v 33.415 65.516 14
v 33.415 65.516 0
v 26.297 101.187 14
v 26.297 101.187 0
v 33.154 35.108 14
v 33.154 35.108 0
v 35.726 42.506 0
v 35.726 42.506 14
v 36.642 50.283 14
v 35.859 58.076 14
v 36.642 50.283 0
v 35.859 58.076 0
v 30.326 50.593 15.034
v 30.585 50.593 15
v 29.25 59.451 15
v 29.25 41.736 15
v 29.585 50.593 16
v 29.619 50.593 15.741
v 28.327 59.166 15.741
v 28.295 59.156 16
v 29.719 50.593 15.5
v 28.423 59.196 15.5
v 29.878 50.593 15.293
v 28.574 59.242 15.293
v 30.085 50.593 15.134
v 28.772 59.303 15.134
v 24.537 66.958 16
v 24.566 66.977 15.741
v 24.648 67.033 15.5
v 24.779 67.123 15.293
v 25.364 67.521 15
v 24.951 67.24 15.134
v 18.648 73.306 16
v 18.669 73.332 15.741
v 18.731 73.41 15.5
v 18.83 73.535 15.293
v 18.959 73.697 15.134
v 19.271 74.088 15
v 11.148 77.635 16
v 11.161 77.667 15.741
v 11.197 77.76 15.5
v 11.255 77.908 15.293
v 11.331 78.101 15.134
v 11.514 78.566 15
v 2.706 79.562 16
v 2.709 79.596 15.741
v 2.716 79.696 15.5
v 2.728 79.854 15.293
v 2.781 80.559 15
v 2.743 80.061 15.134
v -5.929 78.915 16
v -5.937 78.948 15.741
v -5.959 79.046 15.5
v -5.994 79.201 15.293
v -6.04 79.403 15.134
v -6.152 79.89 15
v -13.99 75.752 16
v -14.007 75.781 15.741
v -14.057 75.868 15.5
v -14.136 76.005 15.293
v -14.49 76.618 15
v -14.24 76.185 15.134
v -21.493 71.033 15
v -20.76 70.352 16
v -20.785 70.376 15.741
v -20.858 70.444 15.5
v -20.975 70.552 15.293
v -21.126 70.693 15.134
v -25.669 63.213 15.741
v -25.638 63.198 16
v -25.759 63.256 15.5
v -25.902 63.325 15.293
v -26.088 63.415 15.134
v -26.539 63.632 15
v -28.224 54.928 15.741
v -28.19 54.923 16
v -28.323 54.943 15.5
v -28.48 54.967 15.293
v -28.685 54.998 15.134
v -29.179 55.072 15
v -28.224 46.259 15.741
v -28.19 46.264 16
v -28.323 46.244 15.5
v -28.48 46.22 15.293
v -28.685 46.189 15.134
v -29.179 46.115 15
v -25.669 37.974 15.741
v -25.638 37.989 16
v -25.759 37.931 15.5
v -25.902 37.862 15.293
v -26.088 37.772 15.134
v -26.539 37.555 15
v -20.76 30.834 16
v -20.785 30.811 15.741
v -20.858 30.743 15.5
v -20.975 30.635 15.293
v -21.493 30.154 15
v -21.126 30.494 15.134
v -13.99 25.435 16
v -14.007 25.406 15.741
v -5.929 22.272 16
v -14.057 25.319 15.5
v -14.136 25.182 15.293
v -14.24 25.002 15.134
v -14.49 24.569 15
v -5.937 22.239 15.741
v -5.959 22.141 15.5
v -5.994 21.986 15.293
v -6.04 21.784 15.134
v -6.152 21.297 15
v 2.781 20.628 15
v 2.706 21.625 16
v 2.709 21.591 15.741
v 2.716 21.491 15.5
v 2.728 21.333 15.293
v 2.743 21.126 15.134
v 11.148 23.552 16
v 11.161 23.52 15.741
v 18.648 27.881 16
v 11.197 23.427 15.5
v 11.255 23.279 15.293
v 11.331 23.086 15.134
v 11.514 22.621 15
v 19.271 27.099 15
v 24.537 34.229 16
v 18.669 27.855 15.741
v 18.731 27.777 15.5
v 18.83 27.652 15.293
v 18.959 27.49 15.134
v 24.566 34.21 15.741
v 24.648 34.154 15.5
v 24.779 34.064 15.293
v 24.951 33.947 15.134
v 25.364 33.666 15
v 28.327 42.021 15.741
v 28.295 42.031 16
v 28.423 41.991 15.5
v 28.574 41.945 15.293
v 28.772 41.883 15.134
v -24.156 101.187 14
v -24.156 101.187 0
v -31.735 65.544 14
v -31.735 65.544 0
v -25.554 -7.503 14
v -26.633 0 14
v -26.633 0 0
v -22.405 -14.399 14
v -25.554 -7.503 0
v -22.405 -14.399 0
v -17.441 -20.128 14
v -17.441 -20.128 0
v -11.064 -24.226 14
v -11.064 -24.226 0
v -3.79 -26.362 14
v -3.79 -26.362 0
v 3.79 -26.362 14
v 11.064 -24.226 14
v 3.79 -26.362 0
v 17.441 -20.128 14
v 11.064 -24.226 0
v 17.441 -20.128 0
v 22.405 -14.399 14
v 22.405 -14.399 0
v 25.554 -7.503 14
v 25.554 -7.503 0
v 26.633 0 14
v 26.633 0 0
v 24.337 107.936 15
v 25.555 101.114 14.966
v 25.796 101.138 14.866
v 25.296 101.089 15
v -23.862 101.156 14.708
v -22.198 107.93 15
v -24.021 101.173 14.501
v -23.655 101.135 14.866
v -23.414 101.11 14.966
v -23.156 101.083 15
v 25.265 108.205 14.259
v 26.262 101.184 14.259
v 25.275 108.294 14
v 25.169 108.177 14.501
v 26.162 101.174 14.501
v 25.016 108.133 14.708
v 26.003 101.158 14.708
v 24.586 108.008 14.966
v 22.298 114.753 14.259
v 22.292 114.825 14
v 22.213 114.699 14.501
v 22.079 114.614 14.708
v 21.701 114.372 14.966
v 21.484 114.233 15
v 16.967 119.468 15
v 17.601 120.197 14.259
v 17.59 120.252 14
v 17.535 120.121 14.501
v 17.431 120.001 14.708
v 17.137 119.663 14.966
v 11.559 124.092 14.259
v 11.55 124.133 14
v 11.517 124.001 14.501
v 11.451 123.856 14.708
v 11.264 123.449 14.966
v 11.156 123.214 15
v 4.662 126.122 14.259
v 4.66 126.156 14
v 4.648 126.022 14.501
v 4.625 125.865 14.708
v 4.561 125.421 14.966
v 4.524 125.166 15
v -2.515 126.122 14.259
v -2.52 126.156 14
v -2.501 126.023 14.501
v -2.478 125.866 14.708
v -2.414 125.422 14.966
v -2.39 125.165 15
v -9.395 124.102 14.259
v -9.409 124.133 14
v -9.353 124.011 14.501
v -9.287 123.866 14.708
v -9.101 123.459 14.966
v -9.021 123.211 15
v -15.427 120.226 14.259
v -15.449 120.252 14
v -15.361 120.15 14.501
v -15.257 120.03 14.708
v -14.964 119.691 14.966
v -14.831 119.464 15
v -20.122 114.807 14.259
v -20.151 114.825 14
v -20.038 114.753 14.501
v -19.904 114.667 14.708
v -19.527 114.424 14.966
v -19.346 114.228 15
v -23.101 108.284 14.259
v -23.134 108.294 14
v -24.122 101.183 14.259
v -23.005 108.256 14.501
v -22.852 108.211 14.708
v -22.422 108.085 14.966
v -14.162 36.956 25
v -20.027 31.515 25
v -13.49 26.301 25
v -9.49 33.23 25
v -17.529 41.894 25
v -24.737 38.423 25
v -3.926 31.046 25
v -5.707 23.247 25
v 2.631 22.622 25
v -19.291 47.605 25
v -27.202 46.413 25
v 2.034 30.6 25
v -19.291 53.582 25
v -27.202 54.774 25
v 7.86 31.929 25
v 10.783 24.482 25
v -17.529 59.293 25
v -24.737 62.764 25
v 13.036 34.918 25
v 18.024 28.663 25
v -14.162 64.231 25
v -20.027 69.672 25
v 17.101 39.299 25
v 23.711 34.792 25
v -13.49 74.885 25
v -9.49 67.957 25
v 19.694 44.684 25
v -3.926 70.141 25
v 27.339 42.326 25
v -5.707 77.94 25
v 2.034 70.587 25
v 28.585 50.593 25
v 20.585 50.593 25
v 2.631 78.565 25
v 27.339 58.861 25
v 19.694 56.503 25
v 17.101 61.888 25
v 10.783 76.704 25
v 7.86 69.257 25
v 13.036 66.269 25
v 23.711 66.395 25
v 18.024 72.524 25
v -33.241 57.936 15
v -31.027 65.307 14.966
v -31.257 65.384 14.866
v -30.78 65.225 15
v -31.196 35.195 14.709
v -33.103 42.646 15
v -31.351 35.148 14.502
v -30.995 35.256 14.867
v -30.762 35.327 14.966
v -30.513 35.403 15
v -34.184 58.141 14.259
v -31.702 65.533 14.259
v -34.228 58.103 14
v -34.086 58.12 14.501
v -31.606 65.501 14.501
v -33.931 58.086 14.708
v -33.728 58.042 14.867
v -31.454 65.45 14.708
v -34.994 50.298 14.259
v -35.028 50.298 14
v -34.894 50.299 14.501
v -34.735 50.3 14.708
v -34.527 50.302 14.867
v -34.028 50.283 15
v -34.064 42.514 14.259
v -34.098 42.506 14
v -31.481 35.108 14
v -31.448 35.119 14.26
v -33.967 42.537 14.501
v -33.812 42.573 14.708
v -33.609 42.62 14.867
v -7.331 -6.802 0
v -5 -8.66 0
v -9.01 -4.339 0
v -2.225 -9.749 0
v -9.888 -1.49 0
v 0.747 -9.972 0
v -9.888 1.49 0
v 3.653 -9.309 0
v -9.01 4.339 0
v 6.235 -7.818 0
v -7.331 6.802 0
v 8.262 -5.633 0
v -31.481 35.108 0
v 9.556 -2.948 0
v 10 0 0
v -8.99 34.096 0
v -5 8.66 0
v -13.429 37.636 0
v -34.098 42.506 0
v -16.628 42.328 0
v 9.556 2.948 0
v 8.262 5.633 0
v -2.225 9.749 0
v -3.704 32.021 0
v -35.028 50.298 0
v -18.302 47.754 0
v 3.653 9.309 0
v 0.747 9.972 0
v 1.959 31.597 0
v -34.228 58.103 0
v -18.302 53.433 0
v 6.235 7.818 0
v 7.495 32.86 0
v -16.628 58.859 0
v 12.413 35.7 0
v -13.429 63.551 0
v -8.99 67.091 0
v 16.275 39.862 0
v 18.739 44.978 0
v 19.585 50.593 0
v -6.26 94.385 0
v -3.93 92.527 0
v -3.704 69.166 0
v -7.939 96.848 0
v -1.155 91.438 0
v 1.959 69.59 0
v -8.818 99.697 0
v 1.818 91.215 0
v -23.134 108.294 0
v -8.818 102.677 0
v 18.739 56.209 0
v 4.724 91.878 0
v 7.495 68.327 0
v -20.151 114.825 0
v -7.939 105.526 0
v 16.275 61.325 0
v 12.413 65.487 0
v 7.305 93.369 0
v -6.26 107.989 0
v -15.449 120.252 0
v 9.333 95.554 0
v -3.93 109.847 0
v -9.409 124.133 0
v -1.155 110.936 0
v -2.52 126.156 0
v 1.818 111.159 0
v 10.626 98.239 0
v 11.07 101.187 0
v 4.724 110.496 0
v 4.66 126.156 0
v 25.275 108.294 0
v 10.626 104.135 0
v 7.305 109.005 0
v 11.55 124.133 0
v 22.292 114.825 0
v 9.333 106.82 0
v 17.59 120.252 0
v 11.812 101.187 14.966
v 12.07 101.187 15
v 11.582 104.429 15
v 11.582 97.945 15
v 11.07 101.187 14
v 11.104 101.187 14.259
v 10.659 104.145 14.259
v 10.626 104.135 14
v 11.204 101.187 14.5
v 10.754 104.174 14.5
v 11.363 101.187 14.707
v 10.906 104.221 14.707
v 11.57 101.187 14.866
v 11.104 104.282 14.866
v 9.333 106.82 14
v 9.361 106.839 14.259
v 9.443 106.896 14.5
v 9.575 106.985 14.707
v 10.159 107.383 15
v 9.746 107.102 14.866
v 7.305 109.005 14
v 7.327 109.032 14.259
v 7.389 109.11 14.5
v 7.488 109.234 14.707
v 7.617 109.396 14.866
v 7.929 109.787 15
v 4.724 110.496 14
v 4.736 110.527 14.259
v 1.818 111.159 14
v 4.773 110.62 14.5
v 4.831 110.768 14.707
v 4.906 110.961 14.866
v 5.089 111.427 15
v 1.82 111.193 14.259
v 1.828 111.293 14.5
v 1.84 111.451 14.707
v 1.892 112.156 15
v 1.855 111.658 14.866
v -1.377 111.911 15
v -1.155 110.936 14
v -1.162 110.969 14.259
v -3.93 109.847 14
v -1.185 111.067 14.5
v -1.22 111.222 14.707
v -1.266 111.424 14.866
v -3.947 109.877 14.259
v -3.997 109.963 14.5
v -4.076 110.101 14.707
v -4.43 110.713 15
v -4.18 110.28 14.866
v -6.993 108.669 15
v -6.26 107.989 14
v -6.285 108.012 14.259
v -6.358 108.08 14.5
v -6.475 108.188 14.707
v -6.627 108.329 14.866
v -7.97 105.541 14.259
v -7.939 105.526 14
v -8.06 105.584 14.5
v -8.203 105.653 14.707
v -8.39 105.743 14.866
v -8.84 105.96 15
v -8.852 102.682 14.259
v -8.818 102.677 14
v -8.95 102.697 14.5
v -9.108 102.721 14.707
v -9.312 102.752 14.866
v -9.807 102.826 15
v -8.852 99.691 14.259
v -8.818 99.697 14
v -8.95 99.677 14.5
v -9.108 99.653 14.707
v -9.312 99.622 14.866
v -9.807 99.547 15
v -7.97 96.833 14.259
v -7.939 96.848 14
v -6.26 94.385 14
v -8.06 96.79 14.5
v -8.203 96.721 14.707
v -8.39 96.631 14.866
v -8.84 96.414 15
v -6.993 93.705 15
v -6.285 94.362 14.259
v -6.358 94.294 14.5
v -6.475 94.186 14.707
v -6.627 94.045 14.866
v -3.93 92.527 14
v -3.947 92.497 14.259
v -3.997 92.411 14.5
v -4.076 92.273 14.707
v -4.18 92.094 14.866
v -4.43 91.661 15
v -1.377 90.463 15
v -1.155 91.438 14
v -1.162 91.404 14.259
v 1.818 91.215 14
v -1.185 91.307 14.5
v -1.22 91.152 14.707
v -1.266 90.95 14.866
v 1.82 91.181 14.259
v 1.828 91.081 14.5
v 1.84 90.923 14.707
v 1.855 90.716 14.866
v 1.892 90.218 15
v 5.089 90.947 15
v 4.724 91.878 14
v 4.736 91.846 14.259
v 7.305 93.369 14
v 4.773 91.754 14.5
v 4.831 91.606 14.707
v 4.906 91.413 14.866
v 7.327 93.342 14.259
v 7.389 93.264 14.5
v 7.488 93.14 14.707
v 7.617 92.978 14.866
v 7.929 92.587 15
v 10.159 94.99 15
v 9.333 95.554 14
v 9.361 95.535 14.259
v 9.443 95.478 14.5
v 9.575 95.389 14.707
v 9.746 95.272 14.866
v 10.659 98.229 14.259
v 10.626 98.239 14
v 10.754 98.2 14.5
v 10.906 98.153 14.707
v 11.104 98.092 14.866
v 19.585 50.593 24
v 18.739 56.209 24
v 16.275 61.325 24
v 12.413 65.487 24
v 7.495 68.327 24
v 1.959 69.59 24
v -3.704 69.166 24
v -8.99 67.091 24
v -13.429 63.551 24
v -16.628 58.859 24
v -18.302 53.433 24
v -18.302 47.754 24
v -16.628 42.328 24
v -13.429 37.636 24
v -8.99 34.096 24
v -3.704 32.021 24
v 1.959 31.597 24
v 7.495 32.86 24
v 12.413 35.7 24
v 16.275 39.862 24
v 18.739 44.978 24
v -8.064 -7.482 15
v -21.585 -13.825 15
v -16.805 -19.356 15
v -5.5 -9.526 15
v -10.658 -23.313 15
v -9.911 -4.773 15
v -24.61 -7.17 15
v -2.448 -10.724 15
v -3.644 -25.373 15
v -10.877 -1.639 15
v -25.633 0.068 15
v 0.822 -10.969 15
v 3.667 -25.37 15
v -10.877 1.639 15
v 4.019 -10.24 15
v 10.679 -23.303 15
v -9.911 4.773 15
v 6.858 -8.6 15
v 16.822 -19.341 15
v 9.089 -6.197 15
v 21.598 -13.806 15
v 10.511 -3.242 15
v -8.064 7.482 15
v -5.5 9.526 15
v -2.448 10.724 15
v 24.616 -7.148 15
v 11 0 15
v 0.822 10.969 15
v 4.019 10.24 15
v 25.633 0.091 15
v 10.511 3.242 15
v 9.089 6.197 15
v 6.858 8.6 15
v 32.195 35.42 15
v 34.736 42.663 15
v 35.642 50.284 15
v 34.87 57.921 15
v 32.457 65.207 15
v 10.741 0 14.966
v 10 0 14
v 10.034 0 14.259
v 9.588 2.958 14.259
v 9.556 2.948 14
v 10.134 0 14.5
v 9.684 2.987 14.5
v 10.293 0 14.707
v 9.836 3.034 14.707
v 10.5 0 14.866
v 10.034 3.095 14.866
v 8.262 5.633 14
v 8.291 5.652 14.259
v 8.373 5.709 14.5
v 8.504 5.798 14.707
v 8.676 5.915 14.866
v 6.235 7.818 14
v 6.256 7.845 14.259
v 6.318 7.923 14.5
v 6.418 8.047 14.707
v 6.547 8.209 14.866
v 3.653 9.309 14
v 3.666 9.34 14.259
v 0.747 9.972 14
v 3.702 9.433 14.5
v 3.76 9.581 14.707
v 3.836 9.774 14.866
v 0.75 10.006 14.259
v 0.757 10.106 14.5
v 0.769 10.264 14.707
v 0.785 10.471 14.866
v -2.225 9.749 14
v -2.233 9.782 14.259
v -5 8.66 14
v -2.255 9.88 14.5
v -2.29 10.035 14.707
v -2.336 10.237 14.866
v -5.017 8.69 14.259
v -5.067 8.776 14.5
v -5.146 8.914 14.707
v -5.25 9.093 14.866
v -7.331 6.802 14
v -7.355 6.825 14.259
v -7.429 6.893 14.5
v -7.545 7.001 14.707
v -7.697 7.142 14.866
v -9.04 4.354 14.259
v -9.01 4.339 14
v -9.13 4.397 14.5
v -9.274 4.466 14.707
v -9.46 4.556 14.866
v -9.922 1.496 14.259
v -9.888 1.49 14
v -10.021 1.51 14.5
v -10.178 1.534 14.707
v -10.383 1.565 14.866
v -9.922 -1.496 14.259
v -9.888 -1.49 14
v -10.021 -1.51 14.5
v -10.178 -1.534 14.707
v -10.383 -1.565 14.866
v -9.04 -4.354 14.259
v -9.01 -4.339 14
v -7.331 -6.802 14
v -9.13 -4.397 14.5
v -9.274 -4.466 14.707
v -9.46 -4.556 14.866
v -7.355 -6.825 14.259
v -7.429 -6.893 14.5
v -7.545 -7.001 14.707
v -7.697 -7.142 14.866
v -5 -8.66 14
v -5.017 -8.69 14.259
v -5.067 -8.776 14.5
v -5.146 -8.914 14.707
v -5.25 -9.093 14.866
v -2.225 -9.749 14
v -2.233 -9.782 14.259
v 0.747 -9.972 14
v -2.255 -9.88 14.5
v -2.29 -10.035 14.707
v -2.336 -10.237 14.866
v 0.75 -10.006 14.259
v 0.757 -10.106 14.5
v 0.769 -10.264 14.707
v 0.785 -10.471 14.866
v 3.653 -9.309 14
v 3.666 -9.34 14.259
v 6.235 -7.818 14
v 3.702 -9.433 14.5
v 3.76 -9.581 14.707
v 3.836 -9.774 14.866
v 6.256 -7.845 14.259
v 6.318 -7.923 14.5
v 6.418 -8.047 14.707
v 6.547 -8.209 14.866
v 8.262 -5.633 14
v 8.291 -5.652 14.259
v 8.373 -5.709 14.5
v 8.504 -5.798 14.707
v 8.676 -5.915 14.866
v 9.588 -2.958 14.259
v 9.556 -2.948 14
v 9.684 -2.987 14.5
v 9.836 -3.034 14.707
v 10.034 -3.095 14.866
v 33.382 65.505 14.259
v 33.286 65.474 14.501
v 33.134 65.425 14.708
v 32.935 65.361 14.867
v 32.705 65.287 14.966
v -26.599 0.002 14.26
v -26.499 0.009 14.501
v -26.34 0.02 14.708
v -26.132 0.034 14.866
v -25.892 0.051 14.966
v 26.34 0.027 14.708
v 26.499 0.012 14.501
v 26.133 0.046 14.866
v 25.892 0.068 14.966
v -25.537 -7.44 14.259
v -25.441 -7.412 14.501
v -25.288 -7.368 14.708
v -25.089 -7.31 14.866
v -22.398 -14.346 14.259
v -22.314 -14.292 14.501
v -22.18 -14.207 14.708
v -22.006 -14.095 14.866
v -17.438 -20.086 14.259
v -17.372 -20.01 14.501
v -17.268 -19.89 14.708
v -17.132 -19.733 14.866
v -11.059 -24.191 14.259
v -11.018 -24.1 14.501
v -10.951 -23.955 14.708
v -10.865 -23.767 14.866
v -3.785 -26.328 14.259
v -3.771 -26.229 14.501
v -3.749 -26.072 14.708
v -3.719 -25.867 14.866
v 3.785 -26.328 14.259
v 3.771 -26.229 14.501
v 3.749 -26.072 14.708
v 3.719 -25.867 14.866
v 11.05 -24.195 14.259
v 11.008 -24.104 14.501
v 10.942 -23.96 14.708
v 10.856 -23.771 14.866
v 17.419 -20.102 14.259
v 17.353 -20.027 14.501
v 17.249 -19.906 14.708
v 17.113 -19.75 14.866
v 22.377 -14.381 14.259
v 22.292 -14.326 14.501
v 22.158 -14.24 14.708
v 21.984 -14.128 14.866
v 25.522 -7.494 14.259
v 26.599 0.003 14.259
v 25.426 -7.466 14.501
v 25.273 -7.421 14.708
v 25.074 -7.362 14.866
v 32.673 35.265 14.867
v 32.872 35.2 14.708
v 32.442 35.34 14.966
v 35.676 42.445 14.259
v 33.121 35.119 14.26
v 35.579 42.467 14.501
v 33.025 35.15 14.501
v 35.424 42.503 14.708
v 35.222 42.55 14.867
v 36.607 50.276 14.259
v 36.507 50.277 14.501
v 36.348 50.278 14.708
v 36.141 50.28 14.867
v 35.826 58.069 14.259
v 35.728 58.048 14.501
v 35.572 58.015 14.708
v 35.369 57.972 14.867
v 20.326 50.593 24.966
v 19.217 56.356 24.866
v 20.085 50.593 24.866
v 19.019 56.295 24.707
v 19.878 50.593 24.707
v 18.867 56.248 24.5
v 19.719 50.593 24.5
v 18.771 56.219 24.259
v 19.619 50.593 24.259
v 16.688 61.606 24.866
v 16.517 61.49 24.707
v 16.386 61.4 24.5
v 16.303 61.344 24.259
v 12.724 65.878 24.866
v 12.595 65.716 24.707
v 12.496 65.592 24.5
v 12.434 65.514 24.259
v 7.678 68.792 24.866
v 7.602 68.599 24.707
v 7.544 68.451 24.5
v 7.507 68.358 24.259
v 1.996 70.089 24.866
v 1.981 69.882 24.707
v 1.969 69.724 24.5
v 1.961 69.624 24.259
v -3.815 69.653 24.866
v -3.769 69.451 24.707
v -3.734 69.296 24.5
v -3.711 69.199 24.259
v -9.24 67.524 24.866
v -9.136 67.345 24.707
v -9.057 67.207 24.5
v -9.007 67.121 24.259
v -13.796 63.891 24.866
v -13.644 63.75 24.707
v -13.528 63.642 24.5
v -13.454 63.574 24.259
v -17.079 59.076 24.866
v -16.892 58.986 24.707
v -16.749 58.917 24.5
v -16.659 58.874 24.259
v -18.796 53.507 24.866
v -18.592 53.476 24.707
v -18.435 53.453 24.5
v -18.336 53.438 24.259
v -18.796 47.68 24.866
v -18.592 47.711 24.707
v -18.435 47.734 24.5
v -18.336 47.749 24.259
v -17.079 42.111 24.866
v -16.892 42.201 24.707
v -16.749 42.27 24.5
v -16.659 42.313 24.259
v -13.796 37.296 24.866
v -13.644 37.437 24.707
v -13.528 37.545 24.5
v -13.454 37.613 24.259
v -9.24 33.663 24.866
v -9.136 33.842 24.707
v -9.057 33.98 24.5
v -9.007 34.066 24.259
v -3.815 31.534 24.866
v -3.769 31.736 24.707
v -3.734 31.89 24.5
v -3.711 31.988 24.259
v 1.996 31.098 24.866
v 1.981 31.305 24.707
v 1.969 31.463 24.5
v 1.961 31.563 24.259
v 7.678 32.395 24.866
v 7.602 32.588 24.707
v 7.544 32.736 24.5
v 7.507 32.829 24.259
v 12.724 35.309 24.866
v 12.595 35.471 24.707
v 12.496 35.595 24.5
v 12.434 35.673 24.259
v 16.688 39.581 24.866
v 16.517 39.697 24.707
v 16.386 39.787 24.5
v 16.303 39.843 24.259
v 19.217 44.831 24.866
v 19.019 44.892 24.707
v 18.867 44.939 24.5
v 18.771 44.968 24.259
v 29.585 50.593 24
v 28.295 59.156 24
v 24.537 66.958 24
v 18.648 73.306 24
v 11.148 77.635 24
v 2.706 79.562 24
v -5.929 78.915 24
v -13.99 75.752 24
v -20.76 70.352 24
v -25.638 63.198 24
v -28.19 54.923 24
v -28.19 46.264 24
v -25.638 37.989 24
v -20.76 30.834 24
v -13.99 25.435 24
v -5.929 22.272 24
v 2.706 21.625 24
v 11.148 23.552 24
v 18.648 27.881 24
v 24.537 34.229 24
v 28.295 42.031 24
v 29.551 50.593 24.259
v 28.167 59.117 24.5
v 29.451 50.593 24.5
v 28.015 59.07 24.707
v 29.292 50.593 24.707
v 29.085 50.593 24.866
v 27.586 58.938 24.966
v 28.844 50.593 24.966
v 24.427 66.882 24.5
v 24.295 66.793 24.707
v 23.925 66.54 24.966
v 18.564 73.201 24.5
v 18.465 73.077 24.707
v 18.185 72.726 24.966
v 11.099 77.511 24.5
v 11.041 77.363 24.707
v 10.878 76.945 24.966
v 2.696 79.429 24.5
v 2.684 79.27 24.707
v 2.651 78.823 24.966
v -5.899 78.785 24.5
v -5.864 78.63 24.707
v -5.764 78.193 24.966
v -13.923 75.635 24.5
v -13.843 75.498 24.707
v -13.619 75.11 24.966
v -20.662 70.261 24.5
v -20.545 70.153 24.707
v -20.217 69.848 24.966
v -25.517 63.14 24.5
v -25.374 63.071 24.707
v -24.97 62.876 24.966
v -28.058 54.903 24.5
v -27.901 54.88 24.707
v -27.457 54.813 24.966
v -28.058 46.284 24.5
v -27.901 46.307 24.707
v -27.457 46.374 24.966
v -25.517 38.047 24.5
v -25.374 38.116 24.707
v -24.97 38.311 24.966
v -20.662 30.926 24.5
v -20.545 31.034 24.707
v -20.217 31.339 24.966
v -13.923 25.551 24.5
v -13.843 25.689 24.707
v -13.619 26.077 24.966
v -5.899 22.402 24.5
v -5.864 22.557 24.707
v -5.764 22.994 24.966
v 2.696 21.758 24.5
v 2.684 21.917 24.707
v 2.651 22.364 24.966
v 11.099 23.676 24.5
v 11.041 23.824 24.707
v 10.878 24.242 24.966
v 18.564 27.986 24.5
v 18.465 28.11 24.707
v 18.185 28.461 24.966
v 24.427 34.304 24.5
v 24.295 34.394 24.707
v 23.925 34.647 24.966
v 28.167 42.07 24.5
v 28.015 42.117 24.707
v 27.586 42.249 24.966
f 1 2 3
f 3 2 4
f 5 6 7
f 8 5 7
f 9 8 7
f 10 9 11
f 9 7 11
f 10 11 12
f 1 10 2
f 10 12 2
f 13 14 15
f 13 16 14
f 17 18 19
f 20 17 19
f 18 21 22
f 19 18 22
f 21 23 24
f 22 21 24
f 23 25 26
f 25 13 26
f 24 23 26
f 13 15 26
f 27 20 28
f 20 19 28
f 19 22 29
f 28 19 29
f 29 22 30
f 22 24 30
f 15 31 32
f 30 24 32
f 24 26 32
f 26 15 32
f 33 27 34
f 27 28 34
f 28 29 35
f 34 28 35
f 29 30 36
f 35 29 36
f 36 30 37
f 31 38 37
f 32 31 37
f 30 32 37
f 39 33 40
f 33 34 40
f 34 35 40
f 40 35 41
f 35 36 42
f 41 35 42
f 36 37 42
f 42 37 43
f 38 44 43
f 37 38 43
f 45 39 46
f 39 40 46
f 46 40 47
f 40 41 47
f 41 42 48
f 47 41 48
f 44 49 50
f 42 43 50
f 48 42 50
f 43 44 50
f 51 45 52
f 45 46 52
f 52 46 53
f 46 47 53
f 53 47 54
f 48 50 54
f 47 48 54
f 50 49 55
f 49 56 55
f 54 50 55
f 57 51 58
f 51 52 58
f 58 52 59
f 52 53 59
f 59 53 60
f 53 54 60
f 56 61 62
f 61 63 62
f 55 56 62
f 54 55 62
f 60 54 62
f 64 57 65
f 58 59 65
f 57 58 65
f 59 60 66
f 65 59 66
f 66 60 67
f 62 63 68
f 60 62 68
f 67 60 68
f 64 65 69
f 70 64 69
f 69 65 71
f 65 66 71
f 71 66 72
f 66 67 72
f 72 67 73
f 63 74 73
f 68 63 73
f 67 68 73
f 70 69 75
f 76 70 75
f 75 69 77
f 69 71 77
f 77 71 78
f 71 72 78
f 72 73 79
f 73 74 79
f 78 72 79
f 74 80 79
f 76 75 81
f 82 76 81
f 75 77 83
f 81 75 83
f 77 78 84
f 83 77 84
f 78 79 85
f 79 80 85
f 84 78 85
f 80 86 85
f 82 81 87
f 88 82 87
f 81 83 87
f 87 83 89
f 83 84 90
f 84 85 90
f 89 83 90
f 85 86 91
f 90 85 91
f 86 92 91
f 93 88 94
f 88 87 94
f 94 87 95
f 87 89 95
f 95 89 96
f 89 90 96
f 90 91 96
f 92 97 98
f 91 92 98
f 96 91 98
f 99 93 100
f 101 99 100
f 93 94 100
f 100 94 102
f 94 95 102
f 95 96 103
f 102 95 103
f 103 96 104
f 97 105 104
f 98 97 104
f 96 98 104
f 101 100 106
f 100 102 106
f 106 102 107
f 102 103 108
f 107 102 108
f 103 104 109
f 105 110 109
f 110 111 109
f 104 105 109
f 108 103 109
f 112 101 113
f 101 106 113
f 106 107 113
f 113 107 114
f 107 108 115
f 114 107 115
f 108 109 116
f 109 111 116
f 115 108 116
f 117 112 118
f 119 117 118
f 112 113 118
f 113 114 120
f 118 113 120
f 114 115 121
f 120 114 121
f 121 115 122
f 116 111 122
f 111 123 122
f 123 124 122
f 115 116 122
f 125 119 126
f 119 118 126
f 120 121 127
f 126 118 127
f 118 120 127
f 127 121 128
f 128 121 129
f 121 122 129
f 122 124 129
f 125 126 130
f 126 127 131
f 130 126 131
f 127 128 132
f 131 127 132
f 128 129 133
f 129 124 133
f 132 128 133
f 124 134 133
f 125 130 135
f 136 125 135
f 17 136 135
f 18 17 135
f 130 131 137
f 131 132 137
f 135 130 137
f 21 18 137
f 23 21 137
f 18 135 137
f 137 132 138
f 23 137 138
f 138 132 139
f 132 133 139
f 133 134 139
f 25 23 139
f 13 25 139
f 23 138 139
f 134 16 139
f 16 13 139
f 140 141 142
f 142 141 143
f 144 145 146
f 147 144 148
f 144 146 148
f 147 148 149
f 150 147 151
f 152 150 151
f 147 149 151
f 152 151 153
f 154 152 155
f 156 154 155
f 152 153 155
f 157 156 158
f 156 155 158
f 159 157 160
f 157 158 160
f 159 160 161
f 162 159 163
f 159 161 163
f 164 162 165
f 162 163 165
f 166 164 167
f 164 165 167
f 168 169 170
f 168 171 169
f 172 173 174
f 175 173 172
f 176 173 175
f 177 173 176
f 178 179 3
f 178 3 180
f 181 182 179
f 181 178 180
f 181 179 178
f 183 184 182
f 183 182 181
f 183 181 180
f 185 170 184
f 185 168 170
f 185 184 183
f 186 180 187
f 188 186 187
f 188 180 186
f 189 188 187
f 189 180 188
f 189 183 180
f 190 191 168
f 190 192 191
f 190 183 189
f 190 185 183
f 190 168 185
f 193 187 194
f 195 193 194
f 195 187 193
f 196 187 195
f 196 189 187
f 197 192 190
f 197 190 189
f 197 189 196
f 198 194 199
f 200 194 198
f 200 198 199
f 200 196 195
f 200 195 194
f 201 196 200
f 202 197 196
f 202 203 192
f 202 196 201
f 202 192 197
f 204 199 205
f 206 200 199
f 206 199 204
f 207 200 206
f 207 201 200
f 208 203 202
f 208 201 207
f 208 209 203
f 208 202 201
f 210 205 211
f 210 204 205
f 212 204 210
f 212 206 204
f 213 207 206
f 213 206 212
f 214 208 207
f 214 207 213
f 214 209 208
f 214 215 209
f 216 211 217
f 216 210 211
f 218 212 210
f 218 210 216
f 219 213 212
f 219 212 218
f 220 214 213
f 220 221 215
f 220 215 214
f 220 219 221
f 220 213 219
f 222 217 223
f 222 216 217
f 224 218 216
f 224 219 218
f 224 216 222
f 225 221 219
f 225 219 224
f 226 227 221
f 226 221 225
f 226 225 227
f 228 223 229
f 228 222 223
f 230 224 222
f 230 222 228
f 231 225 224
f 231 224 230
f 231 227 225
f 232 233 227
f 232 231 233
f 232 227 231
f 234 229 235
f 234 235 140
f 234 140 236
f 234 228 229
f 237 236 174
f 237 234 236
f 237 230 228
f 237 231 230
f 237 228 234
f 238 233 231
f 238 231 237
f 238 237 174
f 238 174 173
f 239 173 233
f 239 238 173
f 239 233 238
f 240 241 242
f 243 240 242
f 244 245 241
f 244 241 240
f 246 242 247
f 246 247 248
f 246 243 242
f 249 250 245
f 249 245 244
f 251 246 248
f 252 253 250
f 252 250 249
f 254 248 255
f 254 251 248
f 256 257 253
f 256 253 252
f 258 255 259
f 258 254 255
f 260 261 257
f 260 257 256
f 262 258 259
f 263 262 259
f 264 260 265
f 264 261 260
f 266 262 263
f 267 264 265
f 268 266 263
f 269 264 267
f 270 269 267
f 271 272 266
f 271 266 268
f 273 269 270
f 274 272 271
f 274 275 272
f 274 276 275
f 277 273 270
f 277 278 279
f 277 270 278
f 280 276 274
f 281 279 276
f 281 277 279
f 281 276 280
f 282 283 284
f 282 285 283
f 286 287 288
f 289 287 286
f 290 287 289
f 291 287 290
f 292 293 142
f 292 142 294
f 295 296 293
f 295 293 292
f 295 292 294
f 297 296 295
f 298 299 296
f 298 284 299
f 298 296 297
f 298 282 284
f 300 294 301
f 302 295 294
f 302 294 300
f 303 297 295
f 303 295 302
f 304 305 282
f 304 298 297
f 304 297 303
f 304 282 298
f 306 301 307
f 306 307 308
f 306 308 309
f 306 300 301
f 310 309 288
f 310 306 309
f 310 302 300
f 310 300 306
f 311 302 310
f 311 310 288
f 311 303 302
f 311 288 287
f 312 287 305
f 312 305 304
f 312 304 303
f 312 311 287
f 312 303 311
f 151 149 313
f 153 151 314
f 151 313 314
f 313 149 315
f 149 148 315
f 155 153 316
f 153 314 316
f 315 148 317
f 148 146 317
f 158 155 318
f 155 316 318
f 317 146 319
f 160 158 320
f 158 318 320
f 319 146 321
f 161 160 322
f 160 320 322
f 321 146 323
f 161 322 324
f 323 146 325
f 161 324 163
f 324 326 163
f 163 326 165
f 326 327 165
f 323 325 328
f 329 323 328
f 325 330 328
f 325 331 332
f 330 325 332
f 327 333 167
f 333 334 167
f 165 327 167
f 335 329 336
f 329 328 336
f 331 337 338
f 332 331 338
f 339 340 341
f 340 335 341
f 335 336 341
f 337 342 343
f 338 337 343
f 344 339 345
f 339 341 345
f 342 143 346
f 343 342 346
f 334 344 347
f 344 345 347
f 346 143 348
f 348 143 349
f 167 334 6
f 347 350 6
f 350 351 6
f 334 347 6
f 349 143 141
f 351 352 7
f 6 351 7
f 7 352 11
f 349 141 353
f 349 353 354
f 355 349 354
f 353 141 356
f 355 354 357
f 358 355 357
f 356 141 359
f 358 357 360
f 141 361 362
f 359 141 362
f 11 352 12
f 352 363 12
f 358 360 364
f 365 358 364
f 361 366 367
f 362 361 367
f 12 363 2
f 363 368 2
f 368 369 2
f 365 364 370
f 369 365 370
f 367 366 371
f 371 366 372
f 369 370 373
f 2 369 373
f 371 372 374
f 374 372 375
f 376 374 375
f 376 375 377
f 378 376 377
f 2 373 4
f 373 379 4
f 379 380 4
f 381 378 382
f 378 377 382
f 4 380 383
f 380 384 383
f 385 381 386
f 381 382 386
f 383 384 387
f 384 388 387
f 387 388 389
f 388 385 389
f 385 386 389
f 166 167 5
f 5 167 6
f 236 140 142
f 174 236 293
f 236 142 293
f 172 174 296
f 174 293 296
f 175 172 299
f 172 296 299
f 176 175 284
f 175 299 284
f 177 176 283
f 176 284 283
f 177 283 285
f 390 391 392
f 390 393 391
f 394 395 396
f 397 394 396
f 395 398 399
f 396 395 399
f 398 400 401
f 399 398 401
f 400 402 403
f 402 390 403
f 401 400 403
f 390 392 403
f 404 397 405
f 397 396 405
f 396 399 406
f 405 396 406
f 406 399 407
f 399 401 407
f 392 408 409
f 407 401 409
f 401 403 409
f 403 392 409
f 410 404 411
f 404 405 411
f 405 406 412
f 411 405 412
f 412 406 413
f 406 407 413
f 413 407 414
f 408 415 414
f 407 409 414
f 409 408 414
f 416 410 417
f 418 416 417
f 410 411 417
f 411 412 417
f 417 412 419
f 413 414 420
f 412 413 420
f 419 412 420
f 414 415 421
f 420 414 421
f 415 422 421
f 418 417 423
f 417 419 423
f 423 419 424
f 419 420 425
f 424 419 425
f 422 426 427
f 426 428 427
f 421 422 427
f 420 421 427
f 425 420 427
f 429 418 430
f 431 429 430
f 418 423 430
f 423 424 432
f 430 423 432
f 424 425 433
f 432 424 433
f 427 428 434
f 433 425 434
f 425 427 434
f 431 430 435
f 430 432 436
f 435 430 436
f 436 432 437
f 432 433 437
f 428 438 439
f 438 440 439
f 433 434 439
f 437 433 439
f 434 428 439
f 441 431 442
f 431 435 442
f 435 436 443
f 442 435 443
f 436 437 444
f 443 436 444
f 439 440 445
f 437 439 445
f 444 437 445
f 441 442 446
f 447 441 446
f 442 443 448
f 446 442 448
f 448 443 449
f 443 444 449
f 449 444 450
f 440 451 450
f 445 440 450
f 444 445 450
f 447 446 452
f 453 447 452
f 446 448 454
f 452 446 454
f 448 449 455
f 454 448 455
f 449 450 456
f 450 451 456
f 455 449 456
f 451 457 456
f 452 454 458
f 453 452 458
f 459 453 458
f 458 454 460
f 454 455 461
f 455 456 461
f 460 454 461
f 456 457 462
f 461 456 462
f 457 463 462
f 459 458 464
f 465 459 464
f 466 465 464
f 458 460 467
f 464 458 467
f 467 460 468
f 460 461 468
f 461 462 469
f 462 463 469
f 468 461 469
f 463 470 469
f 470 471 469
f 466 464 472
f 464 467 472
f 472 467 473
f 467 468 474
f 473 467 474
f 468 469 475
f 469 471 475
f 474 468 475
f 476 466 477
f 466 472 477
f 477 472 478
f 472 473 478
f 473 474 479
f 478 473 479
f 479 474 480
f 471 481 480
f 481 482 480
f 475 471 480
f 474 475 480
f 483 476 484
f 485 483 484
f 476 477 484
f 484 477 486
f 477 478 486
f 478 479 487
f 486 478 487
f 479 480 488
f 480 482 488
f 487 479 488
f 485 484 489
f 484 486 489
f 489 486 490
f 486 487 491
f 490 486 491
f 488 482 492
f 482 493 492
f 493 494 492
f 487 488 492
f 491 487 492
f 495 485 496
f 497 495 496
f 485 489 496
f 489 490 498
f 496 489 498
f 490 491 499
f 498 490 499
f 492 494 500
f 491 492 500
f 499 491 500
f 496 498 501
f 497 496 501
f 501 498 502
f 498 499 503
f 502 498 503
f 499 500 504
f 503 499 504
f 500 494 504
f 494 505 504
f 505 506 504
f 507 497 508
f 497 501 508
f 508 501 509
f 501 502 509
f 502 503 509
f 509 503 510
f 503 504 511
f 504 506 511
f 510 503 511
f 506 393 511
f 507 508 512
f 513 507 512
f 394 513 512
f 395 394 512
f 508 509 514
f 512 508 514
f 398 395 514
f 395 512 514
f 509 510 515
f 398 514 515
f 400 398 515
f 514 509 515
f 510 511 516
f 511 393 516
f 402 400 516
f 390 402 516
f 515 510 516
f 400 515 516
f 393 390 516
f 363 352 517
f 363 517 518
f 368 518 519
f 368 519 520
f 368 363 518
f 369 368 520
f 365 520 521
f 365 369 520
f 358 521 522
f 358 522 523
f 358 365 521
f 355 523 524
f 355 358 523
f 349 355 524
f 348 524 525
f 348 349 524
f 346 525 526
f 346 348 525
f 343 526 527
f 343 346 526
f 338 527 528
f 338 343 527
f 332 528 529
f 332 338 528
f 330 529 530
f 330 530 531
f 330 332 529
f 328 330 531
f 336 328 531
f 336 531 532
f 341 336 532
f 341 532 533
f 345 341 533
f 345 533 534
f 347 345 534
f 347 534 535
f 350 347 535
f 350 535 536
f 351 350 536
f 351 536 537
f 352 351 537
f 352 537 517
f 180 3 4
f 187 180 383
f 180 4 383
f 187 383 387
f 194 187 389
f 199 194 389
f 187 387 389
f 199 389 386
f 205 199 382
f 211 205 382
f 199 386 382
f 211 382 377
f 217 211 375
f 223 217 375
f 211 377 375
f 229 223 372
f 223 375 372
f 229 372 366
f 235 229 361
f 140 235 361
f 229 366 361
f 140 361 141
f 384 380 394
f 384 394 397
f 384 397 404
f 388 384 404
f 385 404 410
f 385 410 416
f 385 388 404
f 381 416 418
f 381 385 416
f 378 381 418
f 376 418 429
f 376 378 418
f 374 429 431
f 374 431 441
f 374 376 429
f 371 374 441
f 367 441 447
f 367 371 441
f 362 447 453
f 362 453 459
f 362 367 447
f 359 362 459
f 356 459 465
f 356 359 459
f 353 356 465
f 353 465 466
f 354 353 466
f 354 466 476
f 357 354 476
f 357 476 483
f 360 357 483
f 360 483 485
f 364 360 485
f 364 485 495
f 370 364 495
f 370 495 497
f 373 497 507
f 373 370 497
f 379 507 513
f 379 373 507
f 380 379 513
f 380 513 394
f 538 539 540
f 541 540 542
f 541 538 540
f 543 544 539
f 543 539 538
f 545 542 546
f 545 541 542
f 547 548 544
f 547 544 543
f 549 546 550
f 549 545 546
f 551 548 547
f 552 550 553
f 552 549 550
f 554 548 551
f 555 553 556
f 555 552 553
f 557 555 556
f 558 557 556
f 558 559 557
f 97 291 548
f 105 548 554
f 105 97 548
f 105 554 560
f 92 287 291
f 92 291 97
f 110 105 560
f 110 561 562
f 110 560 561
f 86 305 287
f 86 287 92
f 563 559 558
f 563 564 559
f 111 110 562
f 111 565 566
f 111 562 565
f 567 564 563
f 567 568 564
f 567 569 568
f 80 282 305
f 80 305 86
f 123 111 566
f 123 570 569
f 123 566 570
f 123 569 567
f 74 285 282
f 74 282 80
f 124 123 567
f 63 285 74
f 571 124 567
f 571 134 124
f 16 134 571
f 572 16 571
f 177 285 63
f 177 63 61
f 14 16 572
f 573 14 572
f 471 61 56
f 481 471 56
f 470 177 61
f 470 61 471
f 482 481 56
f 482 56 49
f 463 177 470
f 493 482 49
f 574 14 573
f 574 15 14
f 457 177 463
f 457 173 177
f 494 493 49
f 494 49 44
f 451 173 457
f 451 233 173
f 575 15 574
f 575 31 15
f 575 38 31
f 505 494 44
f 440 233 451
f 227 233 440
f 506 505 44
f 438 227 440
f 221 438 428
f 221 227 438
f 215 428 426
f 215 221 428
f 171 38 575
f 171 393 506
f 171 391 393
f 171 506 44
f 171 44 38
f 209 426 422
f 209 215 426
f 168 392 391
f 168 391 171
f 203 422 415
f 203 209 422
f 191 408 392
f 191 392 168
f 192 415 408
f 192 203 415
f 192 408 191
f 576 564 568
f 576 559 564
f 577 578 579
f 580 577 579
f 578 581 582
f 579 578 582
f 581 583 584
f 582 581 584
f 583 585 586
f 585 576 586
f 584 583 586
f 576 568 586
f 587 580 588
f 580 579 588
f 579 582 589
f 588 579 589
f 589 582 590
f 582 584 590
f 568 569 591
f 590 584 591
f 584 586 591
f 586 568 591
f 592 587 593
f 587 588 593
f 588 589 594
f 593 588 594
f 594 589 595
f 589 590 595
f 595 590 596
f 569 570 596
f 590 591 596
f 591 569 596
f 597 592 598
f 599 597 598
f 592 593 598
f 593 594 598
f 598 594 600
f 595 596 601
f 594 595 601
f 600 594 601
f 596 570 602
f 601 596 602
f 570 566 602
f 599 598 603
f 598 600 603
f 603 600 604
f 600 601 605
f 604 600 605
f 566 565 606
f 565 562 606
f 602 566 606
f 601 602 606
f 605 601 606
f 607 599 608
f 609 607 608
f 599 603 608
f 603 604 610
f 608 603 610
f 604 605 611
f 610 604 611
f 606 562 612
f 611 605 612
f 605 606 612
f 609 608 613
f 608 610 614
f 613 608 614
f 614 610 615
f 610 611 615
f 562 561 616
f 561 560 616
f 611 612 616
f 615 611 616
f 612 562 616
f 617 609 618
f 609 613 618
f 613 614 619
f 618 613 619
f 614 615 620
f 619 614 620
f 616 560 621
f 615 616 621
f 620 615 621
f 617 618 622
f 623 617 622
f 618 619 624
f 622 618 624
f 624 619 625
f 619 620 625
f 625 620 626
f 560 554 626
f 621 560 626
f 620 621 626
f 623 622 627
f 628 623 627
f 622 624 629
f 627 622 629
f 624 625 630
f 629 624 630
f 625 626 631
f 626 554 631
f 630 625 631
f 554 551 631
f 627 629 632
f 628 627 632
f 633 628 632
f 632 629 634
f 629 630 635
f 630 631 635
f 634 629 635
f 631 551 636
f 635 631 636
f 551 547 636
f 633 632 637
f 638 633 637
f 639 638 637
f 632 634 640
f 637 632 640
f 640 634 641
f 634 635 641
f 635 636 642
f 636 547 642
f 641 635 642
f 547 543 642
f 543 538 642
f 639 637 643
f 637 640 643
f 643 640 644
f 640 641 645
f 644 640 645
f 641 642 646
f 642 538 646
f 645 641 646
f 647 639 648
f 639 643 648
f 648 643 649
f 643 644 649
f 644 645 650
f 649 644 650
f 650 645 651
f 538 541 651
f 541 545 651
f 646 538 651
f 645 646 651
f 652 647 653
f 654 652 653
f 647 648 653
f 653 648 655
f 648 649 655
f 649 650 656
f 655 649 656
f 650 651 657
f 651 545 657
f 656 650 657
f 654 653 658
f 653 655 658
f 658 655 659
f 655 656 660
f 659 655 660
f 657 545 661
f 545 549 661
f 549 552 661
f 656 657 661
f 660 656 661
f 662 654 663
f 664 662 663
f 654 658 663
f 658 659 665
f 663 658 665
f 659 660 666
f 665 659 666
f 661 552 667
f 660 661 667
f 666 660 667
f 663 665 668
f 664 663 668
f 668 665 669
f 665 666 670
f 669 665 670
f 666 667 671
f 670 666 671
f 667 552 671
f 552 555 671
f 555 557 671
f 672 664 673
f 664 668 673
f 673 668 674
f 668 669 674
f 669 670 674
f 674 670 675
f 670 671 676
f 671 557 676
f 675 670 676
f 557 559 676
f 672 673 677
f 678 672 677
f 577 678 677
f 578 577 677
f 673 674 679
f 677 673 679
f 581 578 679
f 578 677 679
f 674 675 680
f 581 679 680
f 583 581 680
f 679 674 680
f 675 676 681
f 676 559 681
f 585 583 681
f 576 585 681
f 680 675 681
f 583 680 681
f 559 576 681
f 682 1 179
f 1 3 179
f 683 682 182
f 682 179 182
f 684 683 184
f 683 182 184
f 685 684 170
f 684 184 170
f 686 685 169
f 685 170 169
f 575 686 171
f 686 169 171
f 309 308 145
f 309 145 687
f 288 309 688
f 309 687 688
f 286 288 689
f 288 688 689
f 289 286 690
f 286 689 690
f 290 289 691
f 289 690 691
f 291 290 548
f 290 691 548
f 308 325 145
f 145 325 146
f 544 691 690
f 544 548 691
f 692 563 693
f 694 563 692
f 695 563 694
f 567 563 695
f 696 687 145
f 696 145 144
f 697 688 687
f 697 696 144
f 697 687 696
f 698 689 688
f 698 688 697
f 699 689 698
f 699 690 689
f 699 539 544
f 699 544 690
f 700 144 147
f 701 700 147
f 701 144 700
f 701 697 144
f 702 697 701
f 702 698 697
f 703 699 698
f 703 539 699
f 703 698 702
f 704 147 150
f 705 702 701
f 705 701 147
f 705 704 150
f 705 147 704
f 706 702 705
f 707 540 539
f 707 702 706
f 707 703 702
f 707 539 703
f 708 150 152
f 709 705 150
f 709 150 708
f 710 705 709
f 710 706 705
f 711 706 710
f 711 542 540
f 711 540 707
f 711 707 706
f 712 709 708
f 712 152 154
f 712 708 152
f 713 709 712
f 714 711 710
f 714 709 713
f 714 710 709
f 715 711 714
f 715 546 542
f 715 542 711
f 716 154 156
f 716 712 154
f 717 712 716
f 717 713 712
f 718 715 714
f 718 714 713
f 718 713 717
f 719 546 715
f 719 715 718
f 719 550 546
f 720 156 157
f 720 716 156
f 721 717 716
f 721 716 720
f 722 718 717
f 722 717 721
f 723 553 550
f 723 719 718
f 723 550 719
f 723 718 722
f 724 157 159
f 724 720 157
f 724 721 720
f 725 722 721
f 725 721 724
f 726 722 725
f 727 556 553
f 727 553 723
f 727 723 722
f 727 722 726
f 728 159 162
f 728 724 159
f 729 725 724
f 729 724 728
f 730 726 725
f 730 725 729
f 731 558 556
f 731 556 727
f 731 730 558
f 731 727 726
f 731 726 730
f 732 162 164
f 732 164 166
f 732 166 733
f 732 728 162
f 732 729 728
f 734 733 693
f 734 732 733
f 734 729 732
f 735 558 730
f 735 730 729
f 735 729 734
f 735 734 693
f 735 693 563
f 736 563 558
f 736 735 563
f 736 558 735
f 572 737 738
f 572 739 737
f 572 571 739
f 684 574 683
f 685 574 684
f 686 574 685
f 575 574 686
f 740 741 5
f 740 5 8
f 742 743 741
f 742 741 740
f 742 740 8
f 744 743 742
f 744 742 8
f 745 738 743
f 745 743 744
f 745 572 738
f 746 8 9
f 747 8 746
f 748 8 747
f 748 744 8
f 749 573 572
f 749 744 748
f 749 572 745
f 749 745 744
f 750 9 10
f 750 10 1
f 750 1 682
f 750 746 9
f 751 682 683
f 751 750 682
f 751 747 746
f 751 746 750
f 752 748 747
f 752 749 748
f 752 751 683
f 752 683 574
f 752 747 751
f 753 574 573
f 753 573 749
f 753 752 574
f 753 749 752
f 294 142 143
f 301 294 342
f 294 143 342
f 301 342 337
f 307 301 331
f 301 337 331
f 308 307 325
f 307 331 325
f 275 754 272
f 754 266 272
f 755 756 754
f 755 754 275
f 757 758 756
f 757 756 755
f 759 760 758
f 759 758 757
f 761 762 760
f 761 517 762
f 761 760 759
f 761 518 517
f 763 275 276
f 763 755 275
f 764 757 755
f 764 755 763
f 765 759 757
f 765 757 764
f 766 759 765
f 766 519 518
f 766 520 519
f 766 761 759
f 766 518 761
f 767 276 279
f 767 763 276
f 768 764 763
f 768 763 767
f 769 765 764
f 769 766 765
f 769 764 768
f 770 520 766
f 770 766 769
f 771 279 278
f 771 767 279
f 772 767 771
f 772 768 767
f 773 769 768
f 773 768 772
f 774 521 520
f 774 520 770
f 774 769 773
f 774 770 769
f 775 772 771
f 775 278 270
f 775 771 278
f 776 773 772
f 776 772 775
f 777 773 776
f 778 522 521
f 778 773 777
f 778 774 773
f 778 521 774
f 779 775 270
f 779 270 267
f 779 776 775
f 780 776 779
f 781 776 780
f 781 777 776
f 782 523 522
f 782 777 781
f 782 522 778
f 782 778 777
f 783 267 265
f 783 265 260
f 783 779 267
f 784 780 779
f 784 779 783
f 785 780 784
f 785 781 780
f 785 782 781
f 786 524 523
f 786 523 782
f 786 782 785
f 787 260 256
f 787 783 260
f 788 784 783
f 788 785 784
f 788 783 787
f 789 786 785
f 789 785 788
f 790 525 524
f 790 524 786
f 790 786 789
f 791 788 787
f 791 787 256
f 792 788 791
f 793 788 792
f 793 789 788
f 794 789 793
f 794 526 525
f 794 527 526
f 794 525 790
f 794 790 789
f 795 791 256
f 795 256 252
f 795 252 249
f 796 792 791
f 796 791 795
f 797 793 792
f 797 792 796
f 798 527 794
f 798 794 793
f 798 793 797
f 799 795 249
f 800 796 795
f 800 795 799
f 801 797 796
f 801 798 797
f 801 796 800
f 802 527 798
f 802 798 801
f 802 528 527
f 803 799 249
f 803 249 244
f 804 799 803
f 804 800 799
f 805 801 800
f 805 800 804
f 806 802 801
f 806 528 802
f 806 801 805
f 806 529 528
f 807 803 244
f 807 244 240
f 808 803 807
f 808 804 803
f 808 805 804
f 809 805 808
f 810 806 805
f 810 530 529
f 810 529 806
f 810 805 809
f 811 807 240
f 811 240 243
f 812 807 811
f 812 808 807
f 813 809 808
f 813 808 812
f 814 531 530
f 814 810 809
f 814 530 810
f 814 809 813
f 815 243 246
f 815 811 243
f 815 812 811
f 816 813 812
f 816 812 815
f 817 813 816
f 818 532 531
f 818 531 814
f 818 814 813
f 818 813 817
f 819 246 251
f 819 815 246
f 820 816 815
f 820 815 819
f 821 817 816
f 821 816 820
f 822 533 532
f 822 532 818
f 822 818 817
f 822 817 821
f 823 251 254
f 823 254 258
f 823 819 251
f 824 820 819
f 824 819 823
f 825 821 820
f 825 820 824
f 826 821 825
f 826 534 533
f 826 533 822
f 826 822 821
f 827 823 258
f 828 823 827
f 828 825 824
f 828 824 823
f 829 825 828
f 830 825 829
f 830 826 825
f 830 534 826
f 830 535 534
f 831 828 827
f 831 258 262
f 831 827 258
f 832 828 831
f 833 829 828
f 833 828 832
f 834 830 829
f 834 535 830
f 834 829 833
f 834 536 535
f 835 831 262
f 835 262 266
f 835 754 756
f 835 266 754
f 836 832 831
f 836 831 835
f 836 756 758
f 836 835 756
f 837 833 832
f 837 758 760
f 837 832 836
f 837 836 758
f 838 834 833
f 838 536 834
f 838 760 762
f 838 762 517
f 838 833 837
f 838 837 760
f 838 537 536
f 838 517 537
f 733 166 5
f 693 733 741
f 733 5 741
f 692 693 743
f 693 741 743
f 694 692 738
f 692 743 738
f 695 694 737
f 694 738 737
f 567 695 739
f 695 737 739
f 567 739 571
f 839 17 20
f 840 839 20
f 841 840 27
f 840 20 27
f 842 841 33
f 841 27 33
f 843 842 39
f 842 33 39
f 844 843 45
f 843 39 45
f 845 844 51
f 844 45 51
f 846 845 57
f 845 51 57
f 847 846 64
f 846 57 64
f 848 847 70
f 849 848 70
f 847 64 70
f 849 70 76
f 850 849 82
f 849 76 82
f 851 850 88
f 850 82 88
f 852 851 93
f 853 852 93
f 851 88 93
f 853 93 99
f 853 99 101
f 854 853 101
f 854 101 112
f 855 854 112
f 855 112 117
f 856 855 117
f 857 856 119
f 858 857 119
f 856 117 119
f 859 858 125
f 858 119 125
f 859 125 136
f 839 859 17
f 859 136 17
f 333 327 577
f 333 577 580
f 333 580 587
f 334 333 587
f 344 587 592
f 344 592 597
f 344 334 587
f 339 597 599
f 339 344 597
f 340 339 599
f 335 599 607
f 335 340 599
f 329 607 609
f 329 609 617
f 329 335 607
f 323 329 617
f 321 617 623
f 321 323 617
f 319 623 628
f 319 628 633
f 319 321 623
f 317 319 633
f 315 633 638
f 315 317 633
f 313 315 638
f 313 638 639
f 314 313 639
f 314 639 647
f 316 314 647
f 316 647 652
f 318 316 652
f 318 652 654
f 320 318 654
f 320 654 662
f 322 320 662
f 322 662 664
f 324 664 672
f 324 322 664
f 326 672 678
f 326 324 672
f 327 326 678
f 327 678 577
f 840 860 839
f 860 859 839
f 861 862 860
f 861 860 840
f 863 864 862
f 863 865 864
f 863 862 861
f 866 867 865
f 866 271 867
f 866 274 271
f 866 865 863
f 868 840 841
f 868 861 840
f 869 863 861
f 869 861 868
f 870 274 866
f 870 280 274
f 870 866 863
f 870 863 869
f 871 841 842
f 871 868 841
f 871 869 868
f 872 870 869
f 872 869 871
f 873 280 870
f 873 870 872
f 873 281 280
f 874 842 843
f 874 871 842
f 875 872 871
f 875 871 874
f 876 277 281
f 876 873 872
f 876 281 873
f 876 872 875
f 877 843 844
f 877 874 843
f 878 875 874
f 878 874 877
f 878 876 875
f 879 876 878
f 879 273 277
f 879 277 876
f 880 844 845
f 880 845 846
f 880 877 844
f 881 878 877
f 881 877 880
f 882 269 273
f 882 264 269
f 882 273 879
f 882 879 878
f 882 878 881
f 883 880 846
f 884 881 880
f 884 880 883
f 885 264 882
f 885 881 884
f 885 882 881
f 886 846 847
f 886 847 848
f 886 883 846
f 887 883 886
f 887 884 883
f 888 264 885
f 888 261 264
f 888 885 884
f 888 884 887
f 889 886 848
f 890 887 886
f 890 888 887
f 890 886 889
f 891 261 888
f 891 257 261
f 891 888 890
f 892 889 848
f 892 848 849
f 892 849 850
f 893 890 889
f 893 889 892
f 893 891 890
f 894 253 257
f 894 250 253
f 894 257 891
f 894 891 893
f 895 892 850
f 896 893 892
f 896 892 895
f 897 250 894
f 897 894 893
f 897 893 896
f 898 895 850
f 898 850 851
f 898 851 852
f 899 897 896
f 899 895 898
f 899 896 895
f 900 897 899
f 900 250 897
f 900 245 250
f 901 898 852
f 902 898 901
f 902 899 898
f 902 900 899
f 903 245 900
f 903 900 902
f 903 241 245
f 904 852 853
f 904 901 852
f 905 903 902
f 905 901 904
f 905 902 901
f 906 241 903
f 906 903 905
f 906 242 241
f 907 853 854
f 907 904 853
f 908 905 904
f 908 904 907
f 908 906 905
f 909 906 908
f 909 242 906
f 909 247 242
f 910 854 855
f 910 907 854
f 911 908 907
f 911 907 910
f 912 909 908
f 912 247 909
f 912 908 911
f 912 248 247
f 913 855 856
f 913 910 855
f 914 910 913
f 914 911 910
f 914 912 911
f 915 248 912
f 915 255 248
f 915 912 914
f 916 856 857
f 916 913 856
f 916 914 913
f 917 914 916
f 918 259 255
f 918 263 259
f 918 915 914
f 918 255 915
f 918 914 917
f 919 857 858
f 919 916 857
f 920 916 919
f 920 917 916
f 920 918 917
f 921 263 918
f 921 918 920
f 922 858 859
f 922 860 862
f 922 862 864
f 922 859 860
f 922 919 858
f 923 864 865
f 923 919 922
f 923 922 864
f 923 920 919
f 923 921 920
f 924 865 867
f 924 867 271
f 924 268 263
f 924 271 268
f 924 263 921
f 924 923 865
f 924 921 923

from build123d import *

# Parameters (mm, degrees)
SKETCH1_R           = 10
SKETCH1_R_2         = 19.05
BOSS_EXTRUDE1_DEPTH = 15
SKETCH2_R           = 29.05
SKETCH2_R_2         = 19.05
BOSS_EXTRUDE2_DEPTH = 10
FILLET2_R           = 1
FILLET3_R           = 1


with BuildPart() as part:
    # Sketch1 → Boss-Extrude1 (new body)
    with BuildSketch(Plane.XY):
        with BuildLine():
            Line((-24.155755476, 101.186951407), (-31.734621097, 65.543568739))
            ThreePointArc((-31.734621097, 65.543568739), (-35.02825175, 50.297571146), (-31.481386973, 35.108489681))
            Line((-31.481386973, 35.108489681), (-26.633262651, 0))
            ThreePointArc((-26.633262651, 0), (0, -26.633262651), (26.633262651, 0))
            Line((26.633262651, 0), (33.154025964, 35.108489681))
            ThreePointArc((33.154025964, 35.108489681), (36.641659251, 50.283356744), (33.415195598, 65.515891288))
            Line((33.415195598, 65.515891288), (26.296540608, 101.186951407))
            ThreePointArc((26.296540608, 101.186951407), (1.070392566, 126.413099449), (-24.155755476, 101.186951407))
        make_face()
        with Locations((1.070392566, 101.186951407)):
            Circle(SKETCH1_R, mode=Mode.SUBTRACT)
        Circle(SKETCH1_R, mode=Mode.SUBTRACT)
        with Locations((0.535196283, 50.593475704)):
            Circle(SKETCH1_R_2, mode=Mode.SUBTRACT)
    extrude(amount=BOSS_EXTRUDE1_DEPTH)

    # Sketch2 → Boss-Extrude2 (add)
    with BuildSketch(Plane.XY.offset(15)):
        with Locations((0.535196283, 50.593475704)):
            Circle(SKETCH2_R)
        with Locations((0.535196283, 50.593475704)):
            Circle(SKETCH2_R_2, mode=Mode.SUBTRACT)
    extrude(amount=BOSS_EXTRUDE2_DEPTH)

    # Fillet2
    fillet2_edges = [part.edges().sort_by_distance(p)[0] for p in [
        (-35.02825175, 50.297571146, 15),
        (-29.057324812, 17.554244841, 15),
        (0, -26.633262651, 15),
        (-8.929607434, 101.186951407, 15),
        (29.893644307, 17.554244841, 15),
        (-10, 0, 15),
        (36.641659251, 50.283356744, 15),
        (29.855868103, 83.351421348, 15),
        (-28.514803717, 50.593475704, 15),
        (1.070392566, 126.413099449, 15),
        (-27.945188286, 83.365260073, 15),
    ]]
    fillet(fillet2_edges, radius=FILLET2_R)

    # Fillet3
    fillet3_edges = [part.edges().sort_by_distance(p)[0] for p in [
        (-28.514803717, 50.593475704, 25),
        (-18.514803717, 50.593475704, 25),
    ]]
    fillet(fillet3_edges, radius=FILLET3_R)


solid = part.part
